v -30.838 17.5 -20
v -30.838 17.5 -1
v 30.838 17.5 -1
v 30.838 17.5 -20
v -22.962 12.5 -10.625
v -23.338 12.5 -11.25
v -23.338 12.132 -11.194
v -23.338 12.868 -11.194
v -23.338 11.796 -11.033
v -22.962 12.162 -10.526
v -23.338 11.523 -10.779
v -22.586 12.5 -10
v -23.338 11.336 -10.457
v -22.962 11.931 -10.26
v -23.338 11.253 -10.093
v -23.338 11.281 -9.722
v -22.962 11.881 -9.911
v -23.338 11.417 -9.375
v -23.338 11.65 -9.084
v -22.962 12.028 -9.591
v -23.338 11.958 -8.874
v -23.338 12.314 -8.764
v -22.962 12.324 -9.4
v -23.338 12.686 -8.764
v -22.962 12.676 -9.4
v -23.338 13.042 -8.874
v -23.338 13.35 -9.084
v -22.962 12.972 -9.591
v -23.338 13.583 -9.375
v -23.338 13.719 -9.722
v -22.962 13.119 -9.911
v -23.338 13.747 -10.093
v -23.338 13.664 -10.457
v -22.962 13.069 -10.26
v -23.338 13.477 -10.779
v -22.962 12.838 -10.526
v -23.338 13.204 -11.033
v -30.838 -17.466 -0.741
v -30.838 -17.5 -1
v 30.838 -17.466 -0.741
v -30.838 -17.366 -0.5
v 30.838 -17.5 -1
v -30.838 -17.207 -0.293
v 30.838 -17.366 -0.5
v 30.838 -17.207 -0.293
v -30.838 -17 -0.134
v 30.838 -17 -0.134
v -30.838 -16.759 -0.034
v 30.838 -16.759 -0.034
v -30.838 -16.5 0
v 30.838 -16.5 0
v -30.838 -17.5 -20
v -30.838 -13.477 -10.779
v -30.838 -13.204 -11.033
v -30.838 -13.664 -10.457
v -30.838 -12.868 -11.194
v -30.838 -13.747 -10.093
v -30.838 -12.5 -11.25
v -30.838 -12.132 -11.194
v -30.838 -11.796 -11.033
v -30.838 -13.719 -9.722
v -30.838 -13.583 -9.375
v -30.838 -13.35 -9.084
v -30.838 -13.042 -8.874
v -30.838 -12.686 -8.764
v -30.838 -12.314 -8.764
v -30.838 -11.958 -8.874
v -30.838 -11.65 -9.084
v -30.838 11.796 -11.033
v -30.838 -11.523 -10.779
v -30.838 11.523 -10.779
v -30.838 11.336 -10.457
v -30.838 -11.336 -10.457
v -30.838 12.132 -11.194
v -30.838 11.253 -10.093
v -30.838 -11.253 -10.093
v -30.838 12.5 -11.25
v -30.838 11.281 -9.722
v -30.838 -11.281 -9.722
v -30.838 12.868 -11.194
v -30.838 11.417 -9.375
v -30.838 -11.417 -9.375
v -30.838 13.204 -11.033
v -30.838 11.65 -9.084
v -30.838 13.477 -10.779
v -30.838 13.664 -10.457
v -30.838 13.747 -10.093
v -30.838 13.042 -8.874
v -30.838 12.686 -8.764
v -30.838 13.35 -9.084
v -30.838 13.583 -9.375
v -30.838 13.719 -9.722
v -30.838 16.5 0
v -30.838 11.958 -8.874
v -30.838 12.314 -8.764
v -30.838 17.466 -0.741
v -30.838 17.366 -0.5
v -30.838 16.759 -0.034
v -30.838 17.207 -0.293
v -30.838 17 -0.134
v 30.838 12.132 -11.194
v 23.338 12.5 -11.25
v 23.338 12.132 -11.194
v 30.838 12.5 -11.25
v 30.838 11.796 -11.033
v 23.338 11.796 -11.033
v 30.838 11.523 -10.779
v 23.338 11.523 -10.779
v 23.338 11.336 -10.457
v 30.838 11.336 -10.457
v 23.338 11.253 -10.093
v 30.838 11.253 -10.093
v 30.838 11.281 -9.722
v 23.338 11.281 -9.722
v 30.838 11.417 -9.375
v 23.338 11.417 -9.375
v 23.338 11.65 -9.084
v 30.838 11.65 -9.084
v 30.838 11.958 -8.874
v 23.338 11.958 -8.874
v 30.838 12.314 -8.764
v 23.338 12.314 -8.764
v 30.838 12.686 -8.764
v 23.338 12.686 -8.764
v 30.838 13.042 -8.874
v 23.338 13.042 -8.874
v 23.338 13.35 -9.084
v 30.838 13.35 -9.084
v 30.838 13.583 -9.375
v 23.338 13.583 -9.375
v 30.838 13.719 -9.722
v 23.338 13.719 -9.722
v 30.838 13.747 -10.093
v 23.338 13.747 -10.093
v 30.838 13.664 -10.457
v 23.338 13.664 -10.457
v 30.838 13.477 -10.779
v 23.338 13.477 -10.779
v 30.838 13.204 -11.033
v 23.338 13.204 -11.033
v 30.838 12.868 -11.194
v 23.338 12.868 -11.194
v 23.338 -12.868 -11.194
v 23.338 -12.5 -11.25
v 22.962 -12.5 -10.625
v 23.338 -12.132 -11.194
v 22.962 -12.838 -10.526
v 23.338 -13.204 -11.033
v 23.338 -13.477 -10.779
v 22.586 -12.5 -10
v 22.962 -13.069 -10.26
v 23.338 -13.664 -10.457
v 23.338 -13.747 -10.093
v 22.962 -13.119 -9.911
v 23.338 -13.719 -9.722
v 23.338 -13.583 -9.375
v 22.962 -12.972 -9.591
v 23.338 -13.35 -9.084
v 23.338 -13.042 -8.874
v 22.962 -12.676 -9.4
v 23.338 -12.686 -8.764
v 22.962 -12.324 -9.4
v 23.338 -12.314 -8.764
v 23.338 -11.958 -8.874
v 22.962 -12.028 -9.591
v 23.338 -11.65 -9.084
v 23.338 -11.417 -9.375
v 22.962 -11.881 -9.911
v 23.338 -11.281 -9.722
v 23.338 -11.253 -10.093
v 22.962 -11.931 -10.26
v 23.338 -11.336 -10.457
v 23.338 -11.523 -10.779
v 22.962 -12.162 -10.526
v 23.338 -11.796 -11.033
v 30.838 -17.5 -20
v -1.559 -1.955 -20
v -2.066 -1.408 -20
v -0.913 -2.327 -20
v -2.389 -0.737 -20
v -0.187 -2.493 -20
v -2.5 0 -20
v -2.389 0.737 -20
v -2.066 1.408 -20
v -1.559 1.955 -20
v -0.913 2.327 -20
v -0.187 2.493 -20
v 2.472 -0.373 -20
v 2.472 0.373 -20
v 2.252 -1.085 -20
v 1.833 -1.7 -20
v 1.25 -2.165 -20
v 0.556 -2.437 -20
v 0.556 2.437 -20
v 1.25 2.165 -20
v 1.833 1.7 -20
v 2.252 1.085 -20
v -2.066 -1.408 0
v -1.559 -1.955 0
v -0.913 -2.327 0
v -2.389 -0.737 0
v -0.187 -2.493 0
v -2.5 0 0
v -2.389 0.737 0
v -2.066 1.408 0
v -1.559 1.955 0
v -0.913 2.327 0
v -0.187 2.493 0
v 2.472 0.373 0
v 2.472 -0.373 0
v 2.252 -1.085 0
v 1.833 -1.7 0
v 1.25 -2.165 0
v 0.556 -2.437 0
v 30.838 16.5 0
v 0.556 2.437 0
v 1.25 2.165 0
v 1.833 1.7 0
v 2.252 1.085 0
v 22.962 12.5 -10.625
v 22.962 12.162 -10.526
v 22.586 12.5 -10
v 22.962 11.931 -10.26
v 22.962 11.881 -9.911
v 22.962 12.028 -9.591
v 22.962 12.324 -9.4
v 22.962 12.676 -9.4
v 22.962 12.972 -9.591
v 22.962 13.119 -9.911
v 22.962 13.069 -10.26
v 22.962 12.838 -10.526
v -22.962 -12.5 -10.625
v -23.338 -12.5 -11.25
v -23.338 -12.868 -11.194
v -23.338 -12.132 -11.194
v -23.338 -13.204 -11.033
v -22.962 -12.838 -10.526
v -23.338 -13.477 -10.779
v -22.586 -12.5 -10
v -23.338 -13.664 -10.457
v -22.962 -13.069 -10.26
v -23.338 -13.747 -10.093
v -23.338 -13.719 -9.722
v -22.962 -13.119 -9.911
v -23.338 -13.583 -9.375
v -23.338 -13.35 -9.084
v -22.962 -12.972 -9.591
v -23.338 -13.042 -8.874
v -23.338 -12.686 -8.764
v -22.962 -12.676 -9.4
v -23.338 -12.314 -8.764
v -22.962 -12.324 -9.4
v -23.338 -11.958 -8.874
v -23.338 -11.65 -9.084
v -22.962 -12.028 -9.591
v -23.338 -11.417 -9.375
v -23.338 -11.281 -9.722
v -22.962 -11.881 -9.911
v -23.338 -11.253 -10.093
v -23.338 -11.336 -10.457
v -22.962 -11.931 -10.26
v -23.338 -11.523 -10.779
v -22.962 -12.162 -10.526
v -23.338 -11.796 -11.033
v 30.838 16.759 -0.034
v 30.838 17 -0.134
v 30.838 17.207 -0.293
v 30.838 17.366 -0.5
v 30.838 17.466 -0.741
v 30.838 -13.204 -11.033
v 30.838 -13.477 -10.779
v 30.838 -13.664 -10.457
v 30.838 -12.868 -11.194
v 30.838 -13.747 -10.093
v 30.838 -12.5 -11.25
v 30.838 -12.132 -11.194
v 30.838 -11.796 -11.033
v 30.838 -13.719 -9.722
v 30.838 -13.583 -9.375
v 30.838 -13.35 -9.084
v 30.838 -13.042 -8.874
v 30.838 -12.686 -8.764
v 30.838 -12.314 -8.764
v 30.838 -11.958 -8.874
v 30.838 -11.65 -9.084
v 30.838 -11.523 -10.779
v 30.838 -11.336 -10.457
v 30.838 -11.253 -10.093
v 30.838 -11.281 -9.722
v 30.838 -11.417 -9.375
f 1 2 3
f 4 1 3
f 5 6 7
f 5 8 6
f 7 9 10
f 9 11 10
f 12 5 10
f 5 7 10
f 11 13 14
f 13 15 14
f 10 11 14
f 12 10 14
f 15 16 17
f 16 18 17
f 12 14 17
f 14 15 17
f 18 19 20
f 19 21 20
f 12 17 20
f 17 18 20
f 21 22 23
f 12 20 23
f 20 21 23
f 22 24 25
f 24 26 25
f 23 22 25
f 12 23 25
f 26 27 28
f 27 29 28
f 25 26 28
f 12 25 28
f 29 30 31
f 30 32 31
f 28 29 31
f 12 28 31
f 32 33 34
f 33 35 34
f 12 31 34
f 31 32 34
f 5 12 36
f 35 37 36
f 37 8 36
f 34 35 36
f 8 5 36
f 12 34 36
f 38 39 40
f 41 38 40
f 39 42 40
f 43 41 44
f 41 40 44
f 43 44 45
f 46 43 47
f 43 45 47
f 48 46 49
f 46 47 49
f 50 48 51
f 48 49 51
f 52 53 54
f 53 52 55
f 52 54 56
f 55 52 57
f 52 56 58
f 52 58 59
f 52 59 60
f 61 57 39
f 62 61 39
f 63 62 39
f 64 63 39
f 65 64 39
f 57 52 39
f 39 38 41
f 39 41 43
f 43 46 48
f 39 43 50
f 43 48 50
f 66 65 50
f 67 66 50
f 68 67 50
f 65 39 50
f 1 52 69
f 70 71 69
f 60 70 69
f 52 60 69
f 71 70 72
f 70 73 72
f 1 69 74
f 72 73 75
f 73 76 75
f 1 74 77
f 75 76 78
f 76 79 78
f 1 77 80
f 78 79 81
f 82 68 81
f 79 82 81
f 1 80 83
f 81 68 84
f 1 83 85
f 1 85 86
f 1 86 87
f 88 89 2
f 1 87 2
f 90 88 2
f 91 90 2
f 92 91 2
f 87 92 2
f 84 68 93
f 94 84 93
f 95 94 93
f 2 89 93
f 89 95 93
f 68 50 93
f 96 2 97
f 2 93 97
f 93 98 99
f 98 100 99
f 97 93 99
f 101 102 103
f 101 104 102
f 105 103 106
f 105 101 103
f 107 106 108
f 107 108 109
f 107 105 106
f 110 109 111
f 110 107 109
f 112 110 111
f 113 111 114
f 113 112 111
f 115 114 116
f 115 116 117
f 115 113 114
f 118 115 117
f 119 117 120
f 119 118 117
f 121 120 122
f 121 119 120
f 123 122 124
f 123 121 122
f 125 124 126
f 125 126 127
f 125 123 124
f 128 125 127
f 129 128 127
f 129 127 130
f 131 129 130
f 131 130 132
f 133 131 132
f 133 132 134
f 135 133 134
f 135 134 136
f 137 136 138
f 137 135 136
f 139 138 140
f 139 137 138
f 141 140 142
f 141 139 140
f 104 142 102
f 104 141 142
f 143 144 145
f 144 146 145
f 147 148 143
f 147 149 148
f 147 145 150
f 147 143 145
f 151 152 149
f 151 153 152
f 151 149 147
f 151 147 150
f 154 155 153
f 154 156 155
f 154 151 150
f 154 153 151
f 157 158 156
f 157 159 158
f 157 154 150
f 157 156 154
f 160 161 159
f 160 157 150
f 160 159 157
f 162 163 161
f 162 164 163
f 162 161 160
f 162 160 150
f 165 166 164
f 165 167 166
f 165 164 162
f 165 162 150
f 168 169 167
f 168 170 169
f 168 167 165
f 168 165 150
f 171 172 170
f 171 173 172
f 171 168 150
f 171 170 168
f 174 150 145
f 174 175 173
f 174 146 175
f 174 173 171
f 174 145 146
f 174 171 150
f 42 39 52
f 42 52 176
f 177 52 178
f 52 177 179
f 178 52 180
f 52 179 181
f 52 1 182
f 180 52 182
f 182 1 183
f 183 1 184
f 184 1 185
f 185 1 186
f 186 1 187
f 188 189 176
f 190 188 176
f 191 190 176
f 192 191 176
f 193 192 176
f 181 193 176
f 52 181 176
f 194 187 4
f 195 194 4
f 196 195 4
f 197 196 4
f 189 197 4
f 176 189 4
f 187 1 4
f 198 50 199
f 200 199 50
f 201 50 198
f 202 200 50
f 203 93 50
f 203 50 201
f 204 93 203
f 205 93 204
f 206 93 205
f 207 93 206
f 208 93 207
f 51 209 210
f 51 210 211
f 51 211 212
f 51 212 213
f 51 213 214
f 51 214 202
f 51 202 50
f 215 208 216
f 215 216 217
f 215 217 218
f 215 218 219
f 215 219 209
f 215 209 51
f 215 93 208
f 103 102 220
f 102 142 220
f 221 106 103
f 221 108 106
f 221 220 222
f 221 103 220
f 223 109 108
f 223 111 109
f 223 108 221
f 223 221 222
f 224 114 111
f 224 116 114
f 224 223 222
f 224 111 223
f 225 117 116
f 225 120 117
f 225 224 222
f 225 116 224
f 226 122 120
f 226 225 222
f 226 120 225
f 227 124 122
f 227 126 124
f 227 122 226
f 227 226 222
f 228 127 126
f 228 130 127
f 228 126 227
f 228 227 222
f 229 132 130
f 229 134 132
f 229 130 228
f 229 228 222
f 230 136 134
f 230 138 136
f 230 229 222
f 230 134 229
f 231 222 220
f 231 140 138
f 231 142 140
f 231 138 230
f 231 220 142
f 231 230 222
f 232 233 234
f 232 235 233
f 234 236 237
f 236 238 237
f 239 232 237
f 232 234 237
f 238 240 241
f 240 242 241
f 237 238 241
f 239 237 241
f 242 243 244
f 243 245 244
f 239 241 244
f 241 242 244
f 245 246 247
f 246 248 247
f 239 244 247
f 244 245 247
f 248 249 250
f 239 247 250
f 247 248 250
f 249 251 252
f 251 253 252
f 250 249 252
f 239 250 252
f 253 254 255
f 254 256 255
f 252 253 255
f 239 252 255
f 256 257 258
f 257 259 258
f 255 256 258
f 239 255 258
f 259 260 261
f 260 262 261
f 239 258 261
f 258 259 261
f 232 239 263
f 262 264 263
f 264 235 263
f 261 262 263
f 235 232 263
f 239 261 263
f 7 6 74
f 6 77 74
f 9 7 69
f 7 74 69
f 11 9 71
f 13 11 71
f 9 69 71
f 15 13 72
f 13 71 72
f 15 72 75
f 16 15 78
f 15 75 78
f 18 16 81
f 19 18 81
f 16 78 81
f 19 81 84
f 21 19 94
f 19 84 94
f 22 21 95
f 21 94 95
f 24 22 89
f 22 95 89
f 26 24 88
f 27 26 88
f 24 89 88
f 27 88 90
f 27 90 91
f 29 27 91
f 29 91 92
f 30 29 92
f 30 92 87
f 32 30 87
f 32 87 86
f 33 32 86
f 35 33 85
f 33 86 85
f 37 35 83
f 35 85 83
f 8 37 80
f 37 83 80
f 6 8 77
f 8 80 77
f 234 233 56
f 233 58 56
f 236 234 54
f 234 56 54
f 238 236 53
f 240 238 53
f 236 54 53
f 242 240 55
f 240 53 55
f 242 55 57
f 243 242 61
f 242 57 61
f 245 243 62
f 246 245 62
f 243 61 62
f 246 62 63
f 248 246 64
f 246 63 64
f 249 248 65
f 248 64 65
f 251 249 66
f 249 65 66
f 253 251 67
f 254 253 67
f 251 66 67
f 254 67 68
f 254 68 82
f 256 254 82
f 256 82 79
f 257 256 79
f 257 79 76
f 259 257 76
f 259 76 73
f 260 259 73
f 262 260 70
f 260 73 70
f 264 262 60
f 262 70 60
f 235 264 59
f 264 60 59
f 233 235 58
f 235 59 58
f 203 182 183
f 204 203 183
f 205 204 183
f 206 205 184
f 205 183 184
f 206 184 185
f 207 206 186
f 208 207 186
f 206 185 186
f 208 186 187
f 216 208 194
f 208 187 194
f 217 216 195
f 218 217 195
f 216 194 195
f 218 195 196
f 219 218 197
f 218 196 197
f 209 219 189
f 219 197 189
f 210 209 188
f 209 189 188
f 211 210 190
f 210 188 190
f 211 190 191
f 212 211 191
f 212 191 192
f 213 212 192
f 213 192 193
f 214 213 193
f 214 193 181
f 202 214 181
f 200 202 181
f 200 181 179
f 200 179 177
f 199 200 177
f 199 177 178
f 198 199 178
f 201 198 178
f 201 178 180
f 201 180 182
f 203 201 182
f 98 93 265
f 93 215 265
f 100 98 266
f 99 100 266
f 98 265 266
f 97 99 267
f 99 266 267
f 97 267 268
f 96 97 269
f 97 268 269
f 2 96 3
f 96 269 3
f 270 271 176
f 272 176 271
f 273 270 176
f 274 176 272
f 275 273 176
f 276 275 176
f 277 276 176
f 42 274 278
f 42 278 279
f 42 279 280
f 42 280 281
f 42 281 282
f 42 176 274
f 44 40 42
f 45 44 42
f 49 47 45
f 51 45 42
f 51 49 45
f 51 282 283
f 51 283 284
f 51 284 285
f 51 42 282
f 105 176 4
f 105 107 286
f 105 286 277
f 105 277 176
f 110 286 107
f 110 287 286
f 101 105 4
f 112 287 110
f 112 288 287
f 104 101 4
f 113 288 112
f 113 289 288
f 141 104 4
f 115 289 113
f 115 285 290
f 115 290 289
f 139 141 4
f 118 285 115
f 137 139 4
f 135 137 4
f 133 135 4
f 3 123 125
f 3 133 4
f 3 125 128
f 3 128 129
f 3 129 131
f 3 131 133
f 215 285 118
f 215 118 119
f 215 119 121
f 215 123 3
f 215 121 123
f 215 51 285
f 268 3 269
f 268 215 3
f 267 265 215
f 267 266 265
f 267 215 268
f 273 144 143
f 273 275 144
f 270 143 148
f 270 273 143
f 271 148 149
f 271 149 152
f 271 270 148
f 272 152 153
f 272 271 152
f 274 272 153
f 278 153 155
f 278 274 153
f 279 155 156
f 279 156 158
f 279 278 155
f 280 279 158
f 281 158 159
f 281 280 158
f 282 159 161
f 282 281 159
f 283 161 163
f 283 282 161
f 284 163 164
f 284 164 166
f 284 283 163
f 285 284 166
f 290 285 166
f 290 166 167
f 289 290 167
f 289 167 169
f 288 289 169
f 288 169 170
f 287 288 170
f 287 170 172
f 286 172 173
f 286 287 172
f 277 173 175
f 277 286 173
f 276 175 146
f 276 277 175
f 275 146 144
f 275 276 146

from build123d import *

# Parameters (mm, degrees)
SKETCH2_W                            = 61.675
SKETCH2_H                            = 35
BOSS_EXTRUDE1_DEPTH                  = 20
TAP_DRILL_FOR_M6X1_0_TAP1_D          = 5
TAP_DRILL_FOR_M3X0_5_TAP1_AT_2_COUNT = 2
TAP_DRILL_FOR_M3X0_5_TAP1_AT_2_PITCH = 25
FILLET1_R                            = 1


with BuildPart() as part:
    # Sketch2 → Boss-Extrude1 (new body)
    with BuildSketch(Plane.XY):
        Rectangle(SKETCH2_W, SKETCH2_H)
    extrude(amount=-BOSS_EXTRUDE1_DEPTH)

    # Tap Drill for M6x1.0 Tap1 (through all)
    with Locations(Plane.XY):
        with Locations((0, 0)):
            Hole(TAP_DRILL_FOR_M6X1_0_TAP1_D / 2)

    # Sketch6 → Tap Drill for M3x0.5 Tap1 (revolve, cut)
    with BuildSketch(Plane(origin=(30.8375, 12.5, -10), x_dir=(0, 0, -1), z_dir=(0, 1, 0))):
        Polygon((0, 0), (0, 8.251075774), (1.25, 7.5), (1.25, 0), align=None)
    tap_drill_for_m3x0_5_tap1 = revolve(axis=Axis((37.1875, 12.5, -10), (-1, 0, 0)), mode=Mode.SUBTRACT)

    # Tap Drill for M3x0.5 Tap1 at 2: Tap Drill for M3x0.5 Tap1 ×2
    with Locations(*[(0, -i * TAP_DRILL_FOR_M3X0_5_TAP1_AT_2_PITCH, 0) for i in range(1, TAP_DRILL_FOR_M3X0_5_TAP1_AT_2_COUNT)]):
        add(tap_drill_for_m3x0_5_tap1, mode=Mode.SUBTRACT)

    # Mirror1: Tap Drill for M3x0.5 Tap1 across plane
    add(tap_drill_for_m3x0_5_tap1.mirror(Plane(origin=(0, 0, 0), x_dir=(0, 0, 1), z_dir=(1, 0, 0))), mode=Mode.SUBTRACT)

    # Mirror1 copy 1 sketch → Mirror1 copy 1 (revolve, cut)
    with BuildSketch(Plane(origin=(-30.8375, -12.5, -10), x_dir=(0, 0, -1), z_dir=(0, 1, 0))):
        Polygon((0, 0), (0, -8.251075774), (1.25, -7.5), (1.25, 0), align=None)
    revolve(axis=Axis((-37.1875, -12.5, -10), (-1, 0, 0)), mode=Mode.SUBTRACT)

    # Fillet1
    fillet1_edges = [part.edges().sort_by_distance(p)[0] for p in [
        (0, 17.5, 0),
        (0, -17.5, 0),
    ]]
    fillet(fillet1_edges, radius=FILLET1_R)


solid = part.part
